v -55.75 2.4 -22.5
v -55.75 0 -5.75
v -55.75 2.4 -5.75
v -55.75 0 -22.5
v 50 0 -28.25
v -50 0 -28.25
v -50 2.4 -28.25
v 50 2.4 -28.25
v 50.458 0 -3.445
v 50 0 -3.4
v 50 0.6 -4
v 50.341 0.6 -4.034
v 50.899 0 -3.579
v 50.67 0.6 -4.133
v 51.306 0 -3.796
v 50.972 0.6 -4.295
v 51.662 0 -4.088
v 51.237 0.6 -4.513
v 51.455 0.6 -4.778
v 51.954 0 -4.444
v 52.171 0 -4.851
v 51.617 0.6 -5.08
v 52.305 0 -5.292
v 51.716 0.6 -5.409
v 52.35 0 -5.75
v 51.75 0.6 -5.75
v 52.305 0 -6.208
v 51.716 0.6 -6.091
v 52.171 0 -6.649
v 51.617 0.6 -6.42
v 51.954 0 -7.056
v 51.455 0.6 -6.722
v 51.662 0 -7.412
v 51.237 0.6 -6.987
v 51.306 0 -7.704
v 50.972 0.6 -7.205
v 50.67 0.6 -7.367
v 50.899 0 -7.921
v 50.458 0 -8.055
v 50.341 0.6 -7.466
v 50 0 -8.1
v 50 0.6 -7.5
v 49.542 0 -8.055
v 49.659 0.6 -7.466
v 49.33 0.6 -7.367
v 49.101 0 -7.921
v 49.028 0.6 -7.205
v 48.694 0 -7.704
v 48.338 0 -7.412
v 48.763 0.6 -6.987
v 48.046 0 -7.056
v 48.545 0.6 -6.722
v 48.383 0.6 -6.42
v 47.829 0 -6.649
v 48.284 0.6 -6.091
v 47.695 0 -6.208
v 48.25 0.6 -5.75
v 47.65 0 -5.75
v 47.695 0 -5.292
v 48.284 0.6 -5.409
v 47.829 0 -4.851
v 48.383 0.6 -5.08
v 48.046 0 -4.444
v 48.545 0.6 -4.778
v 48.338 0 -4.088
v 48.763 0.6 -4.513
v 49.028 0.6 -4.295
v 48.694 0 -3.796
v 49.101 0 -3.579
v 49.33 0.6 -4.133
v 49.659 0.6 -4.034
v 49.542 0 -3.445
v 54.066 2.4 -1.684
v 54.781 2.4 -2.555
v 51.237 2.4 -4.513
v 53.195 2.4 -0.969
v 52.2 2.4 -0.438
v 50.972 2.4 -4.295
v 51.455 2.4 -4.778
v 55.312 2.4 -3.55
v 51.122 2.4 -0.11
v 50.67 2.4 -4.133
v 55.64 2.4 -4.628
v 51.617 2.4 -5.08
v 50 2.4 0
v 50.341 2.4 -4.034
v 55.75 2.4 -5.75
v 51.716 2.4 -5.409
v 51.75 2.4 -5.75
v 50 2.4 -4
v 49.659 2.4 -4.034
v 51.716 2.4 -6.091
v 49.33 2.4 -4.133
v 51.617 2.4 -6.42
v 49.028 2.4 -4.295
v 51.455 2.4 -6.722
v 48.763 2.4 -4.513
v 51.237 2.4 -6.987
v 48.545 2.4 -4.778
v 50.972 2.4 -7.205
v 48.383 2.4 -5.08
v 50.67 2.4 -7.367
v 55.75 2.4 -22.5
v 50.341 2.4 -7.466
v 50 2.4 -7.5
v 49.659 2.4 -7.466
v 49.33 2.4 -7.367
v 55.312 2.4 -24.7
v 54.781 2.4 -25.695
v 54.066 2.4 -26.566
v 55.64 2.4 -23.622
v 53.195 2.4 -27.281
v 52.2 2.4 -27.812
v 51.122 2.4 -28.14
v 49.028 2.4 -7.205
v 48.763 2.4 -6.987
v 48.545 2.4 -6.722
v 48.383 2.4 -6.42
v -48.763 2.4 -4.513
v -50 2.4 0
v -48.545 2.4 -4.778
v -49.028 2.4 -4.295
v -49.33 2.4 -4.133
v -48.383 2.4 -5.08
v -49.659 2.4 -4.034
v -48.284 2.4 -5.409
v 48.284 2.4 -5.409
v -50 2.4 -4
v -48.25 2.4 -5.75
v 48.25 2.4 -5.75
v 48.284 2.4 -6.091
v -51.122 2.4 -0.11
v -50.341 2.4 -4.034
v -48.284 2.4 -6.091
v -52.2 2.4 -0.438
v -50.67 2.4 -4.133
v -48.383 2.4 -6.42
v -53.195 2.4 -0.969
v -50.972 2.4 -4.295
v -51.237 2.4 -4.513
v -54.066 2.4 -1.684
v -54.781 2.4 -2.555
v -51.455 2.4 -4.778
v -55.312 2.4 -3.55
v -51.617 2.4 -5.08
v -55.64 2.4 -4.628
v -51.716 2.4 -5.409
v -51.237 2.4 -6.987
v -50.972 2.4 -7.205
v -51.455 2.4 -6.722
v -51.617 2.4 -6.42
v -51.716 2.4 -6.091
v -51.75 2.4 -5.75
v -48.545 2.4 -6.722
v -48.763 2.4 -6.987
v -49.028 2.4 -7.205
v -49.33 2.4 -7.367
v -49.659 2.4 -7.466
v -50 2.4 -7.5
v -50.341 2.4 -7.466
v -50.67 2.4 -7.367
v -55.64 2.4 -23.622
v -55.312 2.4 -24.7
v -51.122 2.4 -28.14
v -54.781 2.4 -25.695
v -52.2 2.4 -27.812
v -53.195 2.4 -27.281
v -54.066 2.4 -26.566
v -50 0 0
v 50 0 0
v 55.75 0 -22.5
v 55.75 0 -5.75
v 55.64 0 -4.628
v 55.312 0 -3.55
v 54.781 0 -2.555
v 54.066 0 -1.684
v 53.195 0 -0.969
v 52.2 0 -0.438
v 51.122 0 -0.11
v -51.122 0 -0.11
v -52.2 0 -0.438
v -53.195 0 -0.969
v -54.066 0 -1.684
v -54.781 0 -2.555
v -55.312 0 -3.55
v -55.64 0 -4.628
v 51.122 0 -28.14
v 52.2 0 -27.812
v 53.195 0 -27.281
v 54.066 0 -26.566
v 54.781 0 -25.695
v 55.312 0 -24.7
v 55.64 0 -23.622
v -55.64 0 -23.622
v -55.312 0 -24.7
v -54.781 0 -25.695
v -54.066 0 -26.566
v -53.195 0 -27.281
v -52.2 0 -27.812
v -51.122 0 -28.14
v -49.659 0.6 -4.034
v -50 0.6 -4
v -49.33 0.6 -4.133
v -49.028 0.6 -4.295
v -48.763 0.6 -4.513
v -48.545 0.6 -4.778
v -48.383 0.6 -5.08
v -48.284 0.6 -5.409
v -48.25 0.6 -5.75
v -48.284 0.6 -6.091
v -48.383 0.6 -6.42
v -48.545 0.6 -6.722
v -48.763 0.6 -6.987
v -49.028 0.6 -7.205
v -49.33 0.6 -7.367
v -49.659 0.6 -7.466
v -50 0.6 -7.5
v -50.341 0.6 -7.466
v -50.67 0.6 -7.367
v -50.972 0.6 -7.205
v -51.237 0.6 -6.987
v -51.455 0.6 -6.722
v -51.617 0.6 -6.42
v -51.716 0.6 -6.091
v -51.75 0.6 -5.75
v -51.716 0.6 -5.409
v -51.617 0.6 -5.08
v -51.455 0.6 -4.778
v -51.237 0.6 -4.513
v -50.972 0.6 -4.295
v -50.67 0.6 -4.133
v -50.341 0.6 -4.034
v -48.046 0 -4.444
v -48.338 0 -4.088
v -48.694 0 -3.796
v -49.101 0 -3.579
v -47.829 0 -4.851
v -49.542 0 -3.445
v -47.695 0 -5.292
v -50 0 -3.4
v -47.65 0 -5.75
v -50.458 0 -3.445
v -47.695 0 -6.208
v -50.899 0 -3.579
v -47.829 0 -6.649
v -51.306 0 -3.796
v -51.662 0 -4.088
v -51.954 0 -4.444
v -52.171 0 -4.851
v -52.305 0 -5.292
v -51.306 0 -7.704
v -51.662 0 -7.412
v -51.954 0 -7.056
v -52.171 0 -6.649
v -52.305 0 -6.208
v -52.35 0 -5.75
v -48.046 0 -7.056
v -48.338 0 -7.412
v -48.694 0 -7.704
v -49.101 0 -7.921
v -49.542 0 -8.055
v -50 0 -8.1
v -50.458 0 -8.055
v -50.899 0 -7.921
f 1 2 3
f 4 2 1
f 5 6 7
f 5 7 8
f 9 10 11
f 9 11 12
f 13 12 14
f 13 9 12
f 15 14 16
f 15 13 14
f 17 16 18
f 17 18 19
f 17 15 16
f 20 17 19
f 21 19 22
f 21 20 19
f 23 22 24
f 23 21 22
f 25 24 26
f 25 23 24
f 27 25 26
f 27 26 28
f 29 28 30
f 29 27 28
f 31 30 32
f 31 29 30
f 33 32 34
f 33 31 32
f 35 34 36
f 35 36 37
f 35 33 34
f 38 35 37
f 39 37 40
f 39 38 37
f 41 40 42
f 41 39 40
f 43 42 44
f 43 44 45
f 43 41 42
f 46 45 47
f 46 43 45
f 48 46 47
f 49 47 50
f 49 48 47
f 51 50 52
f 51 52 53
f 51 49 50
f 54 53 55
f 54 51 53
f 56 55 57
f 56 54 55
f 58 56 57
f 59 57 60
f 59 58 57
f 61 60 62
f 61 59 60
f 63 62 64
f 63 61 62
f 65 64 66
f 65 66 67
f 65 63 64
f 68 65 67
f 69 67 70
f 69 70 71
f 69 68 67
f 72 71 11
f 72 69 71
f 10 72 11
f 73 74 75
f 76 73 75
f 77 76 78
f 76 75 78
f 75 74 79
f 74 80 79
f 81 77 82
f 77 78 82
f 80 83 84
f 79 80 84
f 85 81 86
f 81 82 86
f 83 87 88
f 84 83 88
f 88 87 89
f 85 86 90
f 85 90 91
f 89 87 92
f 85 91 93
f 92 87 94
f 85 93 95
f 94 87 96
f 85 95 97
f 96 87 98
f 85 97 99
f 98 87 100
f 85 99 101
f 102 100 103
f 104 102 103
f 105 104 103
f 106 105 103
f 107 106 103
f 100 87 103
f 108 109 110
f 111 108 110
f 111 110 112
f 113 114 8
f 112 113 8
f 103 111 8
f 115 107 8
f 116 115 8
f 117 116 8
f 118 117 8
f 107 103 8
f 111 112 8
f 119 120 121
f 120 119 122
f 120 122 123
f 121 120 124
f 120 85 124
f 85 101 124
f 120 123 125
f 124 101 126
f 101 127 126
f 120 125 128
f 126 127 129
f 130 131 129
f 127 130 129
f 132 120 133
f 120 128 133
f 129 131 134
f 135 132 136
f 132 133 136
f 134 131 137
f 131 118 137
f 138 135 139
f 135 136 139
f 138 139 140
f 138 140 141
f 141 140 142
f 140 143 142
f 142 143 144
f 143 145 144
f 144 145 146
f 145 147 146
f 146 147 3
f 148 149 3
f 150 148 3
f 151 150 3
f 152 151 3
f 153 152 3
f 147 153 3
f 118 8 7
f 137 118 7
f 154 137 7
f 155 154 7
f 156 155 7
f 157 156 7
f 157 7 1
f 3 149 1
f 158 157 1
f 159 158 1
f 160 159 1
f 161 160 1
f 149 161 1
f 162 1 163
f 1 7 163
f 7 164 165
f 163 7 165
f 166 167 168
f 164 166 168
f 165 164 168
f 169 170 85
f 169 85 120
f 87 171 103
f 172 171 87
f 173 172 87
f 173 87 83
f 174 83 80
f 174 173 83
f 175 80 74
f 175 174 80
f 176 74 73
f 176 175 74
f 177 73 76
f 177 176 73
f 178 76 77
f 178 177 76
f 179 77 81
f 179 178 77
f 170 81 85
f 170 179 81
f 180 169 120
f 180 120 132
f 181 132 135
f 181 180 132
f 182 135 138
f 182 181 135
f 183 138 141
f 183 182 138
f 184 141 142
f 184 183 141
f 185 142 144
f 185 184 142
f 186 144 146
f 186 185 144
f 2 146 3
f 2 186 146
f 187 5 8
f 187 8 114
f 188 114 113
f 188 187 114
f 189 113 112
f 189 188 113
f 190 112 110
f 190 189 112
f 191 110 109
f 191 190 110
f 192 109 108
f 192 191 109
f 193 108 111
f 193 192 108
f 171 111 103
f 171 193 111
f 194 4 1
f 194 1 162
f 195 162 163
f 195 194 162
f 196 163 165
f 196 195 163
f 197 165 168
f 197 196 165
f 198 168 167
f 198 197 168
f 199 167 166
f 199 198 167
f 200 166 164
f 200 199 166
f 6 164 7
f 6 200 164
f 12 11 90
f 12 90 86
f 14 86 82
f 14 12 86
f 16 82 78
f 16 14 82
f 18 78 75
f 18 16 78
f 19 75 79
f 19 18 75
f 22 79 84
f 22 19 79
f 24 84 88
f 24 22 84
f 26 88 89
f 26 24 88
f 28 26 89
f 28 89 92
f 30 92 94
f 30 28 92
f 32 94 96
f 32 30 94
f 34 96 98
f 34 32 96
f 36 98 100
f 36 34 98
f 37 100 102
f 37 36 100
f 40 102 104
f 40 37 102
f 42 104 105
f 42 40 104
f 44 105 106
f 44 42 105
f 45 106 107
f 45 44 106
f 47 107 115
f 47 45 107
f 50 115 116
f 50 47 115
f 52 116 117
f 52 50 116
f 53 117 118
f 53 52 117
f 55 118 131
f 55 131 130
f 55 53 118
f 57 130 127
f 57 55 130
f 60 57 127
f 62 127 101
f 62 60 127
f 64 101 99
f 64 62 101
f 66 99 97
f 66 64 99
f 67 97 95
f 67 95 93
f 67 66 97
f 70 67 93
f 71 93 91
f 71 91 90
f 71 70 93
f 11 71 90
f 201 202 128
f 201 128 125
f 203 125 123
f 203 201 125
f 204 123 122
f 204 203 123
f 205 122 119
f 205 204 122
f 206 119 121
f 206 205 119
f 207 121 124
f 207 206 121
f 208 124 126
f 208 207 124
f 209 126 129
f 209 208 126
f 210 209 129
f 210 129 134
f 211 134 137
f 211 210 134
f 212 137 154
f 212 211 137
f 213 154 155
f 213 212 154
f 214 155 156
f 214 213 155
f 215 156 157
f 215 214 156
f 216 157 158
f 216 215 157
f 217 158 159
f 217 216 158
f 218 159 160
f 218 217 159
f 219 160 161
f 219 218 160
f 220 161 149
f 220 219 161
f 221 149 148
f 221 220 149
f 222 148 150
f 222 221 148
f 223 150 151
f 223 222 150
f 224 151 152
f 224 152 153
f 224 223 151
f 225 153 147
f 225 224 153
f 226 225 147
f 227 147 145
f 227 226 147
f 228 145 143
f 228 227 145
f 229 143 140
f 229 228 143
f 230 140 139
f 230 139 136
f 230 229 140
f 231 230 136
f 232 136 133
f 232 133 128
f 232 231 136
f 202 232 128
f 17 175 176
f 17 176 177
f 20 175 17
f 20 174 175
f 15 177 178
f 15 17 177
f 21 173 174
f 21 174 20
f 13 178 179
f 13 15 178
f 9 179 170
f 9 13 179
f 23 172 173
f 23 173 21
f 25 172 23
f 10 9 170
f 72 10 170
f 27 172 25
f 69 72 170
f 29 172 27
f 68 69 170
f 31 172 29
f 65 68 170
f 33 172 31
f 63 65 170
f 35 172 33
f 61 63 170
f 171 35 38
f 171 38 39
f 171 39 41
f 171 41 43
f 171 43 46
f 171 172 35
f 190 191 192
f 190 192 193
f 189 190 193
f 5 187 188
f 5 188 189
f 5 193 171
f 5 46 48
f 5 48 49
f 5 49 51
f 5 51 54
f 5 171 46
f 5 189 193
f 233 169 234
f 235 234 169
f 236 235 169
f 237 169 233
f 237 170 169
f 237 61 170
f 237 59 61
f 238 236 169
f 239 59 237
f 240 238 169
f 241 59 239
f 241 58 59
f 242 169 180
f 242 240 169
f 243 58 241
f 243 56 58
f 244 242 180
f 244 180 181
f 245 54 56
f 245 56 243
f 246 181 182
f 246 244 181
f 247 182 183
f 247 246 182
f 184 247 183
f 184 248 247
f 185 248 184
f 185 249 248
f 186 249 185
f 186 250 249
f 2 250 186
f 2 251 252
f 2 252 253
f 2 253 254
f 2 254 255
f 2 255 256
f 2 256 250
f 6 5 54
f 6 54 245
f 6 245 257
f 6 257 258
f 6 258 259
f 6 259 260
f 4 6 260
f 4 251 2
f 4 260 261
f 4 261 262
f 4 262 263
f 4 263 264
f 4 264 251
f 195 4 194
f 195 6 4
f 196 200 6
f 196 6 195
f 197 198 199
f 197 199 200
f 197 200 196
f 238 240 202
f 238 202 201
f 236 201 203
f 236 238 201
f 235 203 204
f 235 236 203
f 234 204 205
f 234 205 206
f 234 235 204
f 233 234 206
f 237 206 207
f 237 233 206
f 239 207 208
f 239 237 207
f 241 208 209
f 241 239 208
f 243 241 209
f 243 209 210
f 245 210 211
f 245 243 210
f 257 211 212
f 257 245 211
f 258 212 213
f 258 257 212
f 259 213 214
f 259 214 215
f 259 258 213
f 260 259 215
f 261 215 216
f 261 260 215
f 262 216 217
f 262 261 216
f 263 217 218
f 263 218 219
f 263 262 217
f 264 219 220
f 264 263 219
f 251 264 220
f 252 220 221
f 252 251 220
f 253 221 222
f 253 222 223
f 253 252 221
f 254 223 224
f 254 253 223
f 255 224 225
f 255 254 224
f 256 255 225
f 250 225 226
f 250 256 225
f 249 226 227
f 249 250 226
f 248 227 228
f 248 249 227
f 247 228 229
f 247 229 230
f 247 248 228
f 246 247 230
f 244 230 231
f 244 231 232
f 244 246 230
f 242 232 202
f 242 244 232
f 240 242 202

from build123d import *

# Parameters (mm, degrees)
SKETCH1_R           = 1.75
BOSS_EXTRUDE1_DEPTH = 2.4
CHAMFER1_SIZE       = 0.6


with BuildPart() as part:
    # Sketch1 → Boss-Extrude1 (new body)
    with BuildSketch(Plane(origin=(0, 0, 0), x_dir=(1, 0, 0), z_dir=(0, 1, 0))):
        with BuildLine():
            Line((-50, 28.25), (50, 28.25))
            ThreePointArc((50, 28.25), (54.065863992, 26.565863992), (55.75, 22.5))
            Line((55.75, 22.5), (55.75, 5.75))
            ThreePointArc((55.75, 5.75), (54.065863992, 1.684136008), (50, 0))
            Line((50, 0), (-50, 0))
            ThreePointArc((-50, 0), (-54.065863992, 1.684136008), (-55.75, 5.75))
            Line((-55.75, 5.75), (-55.75, 22.5))
            ThreePointArc((-55.75, 22.5), (-54.065863992, 26.565863992), (-50, 28.25))
        make_face()
        with Locations(Location((-50, 5.75, 0), (0, 0, 270))):
            Circle(SKETCH1_R, mode=Mode.SUBTRACT)
        with Locations(Location((50, 5.75, 0), (0, 0, 270))):
            Circle(SKETCH1_R, mode=Mode.SUBTRACT)
    extrude(amount=BOSS_EXTRUDE1_DEPTH)

    # Chamfer1
    chamfer1_edges = [part.edges().sort_by_distance(p)[0] for p in [
        (50, 0, -7.5),
        (-50, 0, -7.5),
    ]]
    chamfer(chamfer1_edges, length=CHAMFER1_SIZE)


solid = part.part
